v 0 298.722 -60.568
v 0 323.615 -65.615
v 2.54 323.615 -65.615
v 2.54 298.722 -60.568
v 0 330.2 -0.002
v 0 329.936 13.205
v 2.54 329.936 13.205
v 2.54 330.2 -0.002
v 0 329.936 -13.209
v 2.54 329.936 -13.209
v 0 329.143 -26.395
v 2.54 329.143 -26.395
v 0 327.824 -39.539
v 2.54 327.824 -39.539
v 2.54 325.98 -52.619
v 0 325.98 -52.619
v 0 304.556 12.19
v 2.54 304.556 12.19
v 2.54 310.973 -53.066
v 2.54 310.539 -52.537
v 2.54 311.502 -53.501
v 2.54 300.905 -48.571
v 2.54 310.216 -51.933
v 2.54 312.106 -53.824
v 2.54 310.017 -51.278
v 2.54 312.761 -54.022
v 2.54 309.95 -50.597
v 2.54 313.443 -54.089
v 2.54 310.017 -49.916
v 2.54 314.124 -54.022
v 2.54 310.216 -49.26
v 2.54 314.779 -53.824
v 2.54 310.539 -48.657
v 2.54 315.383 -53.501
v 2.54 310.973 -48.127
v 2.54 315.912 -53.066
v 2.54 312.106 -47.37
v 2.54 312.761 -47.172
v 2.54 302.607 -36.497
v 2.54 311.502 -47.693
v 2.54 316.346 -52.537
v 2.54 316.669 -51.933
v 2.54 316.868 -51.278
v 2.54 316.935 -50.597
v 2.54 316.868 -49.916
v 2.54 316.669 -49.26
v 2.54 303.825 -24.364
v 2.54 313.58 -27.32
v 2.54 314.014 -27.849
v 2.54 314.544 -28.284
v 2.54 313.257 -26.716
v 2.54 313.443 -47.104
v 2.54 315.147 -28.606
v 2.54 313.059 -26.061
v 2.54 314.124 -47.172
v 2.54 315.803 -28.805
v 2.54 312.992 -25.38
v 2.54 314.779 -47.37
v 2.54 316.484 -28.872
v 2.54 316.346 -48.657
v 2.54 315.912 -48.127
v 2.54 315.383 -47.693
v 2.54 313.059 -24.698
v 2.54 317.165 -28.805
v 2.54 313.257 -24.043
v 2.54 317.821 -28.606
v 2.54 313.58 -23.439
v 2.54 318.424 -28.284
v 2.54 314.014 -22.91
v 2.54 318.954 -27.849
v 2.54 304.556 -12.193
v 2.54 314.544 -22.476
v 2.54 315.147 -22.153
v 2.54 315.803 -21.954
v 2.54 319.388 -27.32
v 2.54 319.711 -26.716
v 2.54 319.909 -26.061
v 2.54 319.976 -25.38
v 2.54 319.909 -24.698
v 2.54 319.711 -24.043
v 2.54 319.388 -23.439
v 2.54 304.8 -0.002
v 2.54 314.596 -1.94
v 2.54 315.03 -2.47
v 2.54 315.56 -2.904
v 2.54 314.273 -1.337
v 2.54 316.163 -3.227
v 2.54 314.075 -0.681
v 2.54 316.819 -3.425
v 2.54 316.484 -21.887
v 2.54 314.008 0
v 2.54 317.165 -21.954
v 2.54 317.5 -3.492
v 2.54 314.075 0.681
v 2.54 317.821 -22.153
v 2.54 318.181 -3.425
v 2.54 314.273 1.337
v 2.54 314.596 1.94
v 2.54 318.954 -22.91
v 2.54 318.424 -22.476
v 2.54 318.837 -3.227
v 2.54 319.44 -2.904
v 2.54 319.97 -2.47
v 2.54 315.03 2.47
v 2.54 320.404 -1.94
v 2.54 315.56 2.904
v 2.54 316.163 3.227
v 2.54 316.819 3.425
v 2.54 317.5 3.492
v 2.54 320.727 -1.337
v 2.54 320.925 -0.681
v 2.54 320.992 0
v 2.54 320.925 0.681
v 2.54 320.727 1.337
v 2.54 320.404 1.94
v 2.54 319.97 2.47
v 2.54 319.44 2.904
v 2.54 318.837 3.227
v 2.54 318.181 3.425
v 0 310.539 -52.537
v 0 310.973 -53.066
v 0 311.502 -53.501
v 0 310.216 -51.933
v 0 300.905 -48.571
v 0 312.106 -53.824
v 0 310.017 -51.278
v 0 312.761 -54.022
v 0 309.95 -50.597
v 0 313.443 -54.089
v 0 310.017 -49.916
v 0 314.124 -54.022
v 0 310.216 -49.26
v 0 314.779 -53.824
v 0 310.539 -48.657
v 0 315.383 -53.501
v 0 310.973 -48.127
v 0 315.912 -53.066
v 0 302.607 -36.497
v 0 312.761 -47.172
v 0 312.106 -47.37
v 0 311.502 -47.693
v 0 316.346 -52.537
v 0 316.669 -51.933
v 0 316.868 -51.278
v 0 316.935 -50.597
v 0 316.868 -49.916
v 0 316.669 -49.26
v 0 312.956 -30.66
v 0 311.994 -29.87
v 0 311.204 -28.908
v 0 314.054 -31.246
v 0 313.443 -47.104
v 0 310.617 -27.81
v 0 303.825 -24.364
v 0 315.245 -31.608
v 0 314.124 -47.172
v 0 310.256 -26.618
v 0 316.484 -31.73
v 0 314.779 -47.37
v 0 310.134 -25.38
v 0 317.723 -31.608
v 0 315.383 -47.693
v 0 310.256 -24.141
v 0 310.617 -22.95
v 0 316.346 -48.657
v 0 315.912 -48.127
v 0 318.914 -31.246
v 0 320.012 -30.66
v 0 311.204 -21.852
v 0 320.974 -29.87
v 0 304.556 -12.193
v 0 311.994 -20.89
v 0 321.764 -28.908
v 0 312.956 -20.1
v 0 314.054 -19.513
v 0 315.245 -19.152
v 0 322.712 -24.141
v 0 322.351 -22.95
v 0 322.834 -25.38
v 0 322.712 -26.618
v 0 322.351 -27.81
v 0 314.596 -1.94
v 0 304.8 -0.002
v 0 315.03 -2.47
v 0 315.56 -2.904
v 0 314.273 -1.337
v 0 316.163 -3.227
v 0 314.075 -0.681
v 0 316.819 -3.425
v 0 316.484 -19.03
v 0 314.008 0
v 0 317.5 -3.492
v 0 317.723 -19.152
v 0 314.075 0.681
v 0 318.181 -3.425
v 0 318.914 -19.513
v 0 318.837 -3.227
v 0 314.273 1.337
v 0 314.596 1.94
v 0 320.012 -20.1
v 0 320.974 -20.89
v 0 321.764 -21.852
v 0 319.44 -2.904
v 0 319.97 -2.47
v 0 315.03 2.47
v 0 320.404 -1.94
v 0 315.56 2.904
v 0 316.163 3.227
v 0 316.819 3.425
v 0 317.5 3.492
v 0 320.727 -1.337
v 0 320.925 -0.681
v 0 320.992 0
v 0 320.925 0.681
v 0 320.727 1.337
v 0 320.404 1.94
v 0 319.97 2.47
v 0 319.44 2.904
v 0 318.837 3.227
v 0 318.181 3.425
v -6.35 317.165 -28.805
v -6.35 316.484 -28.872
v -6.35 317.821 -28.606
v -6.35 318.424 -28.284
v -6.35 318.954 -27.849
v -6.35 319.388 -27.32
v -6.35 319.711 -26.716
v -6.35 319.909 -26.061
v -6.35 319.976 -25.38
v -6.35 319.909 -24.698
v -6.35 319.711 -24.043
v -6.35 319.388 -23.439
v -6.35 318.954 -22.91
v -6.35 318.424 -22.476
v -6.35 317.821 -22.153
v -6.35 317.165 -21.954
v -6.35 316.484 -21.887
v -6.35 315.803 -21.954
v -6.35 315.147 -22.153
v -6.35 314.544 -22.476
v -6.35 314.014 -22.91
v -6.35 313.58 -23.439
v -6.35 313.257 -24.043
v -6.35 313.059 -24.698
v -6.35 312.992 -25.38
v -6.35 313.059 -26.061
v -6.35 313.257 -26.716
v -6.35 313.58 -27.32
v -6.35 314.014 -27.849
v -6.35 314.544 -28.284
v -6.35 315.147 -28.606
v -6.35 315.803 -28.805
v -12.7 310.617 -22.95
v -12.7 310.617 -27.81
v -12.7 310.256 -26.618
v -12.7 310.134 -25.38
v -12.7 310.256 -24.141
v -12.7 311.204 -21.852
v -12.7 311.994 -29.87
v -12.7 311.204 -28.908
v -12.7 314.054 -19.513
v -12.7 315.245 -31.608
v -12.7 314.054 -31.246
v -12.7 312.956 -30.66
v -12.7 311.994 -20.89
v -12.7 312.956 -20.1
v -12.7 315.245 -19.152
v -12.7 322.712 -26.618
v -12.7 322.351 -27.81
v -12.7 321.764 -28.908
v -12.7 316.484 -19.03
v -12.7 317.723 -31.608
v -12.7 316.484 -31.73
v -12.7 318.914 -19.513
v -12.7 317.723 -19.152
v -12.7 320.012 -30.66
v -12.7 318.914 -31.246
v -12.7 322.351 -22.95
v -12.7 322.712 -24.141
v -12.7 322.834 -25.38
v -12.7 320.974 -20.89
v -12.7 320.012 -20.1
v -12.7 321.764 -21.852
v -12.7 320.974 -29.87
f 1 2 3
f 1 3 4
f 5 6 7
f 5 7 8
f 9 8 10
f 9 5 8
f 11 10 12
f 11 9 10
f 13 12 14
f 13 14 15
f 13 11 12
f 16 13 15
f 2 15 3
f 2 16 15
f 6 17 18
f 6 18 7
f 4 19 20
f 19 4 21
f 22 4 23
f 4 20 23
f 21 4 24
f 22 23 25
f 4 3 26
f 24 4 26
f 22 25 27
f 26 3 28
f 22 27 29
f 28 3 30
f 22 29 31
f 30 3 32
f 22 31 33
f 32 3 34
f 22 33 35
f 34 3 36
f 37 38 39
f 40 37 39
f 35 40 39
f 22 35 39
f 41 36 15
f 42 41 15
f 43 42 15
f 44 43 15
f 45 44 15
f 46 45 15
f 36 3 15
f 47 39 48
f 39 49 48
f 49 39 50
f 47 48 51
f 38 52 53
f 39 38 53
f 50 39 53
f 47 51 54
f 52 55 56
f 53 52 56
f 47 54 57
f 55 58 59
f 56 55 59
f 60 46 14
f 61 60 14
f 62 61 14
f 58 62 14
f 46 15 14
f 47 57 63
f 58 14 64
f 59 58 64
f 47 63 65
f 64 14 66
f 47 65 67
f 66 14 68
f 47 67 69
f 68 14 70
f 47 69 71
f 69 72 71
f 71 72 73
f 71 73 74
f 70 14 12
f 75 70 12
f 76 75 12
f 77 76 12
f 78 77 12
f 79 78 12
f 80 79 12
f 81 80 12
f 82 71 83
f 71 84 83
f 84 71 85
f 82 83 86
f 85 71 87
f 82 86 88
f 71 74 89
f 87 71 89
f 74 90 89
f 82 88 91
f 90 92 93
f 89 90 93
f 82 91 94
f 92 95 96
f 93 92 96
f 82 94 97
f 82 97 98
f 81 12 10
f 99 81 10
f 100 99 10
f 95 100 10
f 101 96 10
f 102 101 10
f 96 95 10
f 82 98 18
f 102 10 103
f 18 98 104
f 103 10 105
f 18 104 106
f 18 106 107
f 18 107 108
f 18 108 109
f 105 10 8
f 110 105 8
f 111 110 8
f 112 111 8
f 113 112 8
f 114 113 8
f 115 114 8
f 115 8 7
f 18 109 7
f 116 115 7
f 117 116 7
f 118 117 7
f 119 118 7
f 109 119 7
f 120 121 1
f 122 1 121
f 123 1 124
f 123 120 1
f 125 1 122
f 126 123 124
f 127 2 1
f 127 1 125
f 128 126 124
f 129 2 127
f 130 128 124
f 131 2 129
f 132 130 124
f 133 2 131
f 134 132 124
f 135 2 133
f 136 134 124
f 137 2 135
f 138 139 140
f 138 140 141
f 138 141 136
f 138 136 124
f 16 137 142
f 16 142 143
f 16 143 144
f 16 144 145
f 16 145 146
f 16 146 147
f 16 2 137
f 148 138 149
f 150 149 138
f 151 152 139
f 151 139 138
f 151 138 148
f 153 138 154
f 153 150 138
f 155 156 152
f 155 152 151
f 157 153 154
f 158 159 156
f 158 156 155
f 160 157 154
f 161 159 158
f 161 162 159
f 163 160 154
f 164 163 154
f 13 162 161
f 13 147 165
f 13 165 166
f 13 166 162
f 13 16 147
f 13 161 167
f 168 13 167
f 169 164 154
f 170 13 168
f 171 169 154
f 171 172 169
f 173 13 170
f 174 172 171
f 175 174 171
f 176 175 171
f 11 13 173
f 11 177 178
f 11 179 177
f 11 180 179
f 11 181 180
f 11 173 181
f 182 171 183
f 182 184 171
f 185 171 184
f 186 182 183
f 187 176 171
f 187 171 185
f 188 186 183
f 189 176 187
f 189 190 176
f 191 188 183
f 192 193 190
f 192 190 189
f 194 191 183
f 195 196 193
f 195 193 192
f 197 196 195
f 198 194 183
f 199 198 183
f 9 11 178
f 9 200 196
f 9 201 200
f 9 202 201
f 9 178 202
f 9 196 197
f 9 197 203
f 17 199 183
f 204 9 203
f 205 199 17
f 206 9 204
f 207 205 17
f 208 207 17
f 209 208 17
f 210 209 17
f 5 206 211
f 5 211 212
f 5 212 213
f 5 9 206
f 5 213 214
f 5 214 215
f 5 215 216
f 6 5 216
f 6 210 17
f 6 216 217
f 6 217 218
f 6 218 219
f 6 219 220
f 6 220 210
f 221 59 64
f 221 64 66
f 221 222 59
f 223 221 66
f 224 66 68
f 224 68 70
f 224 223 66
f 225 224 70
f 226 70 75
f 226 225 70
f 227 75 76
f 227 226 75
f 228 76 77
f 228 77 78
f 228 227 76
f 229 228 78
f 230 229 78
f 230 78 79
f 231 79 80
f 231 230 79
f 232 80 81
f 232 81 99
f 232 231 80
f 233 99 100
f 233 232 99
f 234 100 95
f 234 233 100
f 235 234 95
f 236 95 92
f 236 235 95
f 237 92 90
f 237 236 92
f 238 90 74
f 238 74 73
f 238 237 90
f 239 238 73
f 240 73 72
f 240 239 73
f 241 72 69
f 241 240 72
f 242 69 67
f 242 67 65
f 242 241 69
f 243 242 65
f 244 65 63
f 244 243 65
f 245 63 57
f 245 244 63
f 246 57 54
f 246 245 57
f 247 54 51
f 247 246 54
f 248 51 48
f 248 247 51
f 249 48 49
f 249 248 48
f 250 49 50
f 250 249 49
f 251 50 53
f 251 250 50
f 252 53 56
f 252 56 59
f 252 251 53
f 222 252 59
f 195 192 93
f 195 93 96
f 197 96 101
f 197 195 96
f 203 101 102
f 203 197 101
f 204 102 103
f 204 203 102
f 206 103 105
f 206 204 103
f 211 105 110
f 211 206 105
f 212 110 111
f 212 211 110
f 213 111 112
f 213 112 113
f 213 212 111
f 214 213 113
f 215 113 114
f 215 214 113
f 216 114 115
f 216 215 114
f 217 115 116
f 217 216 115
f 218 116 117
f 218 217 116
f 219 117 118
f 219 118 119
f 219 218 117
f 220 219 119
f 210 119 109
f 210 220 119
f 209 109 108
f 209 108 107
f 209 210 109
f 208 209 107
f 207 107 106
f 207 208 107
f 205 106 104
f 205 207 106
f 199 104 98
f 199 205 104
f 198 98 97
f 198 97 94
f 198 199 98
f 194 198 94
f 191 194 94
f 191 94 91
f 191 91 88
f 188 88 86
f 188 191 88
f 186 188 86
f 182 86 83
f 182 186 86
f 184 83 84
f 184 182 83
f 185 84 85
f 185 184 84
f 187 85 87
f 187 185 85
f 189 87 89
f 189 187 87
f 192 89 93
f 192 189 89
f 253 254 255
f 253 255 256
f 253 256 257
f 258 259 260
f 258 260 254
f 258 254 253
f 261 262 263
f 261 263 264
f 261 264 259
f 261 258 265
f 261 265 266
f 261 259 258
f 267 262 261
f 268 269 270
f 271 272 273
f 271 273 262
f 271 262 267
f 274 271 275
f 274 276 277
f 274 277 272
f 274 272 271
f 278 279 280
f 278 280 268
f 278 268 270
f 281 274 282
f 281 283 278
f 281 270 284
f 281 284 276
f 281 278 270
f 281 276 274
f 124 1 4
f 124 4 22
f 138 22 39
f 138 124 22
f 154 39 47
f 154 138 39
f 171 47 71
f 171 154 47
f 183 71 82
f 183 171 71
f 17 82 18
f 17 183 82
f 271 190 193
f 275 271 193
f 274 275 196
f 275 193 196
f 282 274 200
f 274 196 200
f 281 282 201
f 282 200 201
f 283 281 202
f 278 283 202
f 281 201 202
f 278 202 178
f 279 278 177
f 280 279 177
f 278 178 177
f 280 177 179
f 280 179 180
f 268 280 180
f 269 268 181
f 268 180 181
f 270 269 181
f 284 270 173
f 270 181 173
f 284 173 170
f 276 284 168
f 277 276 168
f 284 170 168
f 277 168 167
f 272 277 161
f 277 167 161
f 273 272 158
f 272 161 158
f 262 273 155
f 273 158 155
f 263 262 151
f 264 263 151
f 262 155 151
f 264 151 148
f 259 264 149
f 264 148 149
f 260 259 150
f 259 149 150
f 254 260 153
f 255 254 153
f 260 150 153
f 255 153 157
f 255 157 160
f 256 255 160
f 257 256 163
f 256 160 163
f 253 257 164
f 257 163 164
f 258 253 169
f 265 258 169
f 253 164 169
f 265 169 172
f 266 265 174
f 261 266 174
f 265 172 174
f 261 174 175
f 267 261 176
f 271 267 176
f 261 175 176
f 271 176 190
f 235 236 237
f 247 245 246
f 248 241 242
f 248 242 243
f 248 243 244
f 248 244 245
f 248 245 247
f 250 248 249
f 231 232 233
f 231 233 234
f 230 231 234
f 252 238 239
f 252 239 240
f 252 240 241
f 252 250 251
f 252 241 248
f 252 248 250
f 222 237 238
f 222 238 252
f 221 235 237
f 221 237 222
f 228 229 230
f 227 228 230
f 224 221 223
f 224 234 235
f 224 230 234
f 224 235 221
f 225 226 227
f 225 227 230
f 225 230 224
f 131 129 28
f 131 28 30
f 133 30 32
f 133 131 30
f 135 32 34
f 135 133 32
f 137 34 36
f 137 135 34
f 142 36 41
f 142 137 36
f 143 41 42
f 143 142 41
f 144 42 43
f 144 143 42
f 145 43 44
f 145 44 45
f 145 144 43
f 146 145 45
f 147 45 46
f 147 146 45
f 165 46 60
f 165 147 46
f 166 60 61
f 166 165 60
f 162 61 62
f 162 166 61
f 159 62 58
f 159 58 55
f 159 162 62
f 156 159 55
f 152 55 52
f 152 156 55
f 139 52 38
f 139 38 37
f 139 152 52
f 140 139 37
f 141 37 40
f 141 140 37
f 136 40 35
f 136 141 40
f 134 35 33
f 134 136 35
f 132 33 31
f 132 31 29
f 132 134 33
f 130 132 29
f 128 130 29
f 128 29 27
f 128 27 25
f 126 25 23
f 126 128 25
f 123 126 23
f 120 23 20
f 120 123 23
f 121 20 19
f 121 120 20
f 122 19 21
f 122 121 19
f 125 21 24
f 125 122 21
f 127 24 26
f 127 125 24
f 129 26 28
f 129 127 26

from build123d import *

# Parameters (mm, degrees)
SKETCH1_R           = 3.4925
BOSS_EXTRUDE1_DEPTH = 2.54
SKETCH2_R           = 6.35
BOSS_EXTRUDE2_DEPTH = 12.7
SKETCH4_R           = 3.4925
CUT_EXTRUDE1_DEPTH  = 6.35


with BuildPart() as part:
    # Sketch1 → Boss-Extrude1 (new body)
    with BuildSketch(Plane(origin=(0, 0, 0), x_dir=(0, 0, -1), z_dir=(1, 0, 0))):
        with BuildLine():
            Line((-12.189561356, 304.55616), (-13.205358136, 329.93584))
            ThreePointArc((-13.205358136, 329.93584), (26.39485874, 329.14336), (65.615293749, 323.615007727))
            Line((65.615293749, 323.615007727), (60.567963461, 298.721545594))
            ThreePointArc((60.567963461, 298.721545594), (24.364484991, 303.82464), (-12.189561356, 304.55616))
        make_face()
        with Locations((0, 317.5)):
            Circle(SKETCH1_R, mode=Mode.SUBTRACT)
        with Locations((25.379671865, 316.484)):
            Circle(SKETCH1_R, mode=Mode.SUBTRACT)
        with Locations((50.596913831, 313.4425024)):
            Circle(SKETCH1_R, mode=Mode.SUBTRACT)
    extrude(amount=BOSS_EXTRUDE1_DEPTH)

    # Sketch2 → Boss-Extrude2 (add)
    with BuildSketch(Plane.ZY):
        with Locations((-25.379671865, 316.484)):
            Circle(SKETCH2_R)
    extrude(amount=BOSS_EXTRUDE2_DEPTH)

    # Sketch4 → Cut-Extrude1 (cut)
    with BuildSketch(Plane(origin=(0, 0, 0), x_dir=(0, 0, -1), z_dir=(1, 0, 0))):
        with Locations((25.379671865, 316.484)):
            Circle(SKETCH4_R)
    extrude(amount=-CUT_EXTRUDE1_DEPTH, mode=Mode.SUBTRACT)


solid = part.part
